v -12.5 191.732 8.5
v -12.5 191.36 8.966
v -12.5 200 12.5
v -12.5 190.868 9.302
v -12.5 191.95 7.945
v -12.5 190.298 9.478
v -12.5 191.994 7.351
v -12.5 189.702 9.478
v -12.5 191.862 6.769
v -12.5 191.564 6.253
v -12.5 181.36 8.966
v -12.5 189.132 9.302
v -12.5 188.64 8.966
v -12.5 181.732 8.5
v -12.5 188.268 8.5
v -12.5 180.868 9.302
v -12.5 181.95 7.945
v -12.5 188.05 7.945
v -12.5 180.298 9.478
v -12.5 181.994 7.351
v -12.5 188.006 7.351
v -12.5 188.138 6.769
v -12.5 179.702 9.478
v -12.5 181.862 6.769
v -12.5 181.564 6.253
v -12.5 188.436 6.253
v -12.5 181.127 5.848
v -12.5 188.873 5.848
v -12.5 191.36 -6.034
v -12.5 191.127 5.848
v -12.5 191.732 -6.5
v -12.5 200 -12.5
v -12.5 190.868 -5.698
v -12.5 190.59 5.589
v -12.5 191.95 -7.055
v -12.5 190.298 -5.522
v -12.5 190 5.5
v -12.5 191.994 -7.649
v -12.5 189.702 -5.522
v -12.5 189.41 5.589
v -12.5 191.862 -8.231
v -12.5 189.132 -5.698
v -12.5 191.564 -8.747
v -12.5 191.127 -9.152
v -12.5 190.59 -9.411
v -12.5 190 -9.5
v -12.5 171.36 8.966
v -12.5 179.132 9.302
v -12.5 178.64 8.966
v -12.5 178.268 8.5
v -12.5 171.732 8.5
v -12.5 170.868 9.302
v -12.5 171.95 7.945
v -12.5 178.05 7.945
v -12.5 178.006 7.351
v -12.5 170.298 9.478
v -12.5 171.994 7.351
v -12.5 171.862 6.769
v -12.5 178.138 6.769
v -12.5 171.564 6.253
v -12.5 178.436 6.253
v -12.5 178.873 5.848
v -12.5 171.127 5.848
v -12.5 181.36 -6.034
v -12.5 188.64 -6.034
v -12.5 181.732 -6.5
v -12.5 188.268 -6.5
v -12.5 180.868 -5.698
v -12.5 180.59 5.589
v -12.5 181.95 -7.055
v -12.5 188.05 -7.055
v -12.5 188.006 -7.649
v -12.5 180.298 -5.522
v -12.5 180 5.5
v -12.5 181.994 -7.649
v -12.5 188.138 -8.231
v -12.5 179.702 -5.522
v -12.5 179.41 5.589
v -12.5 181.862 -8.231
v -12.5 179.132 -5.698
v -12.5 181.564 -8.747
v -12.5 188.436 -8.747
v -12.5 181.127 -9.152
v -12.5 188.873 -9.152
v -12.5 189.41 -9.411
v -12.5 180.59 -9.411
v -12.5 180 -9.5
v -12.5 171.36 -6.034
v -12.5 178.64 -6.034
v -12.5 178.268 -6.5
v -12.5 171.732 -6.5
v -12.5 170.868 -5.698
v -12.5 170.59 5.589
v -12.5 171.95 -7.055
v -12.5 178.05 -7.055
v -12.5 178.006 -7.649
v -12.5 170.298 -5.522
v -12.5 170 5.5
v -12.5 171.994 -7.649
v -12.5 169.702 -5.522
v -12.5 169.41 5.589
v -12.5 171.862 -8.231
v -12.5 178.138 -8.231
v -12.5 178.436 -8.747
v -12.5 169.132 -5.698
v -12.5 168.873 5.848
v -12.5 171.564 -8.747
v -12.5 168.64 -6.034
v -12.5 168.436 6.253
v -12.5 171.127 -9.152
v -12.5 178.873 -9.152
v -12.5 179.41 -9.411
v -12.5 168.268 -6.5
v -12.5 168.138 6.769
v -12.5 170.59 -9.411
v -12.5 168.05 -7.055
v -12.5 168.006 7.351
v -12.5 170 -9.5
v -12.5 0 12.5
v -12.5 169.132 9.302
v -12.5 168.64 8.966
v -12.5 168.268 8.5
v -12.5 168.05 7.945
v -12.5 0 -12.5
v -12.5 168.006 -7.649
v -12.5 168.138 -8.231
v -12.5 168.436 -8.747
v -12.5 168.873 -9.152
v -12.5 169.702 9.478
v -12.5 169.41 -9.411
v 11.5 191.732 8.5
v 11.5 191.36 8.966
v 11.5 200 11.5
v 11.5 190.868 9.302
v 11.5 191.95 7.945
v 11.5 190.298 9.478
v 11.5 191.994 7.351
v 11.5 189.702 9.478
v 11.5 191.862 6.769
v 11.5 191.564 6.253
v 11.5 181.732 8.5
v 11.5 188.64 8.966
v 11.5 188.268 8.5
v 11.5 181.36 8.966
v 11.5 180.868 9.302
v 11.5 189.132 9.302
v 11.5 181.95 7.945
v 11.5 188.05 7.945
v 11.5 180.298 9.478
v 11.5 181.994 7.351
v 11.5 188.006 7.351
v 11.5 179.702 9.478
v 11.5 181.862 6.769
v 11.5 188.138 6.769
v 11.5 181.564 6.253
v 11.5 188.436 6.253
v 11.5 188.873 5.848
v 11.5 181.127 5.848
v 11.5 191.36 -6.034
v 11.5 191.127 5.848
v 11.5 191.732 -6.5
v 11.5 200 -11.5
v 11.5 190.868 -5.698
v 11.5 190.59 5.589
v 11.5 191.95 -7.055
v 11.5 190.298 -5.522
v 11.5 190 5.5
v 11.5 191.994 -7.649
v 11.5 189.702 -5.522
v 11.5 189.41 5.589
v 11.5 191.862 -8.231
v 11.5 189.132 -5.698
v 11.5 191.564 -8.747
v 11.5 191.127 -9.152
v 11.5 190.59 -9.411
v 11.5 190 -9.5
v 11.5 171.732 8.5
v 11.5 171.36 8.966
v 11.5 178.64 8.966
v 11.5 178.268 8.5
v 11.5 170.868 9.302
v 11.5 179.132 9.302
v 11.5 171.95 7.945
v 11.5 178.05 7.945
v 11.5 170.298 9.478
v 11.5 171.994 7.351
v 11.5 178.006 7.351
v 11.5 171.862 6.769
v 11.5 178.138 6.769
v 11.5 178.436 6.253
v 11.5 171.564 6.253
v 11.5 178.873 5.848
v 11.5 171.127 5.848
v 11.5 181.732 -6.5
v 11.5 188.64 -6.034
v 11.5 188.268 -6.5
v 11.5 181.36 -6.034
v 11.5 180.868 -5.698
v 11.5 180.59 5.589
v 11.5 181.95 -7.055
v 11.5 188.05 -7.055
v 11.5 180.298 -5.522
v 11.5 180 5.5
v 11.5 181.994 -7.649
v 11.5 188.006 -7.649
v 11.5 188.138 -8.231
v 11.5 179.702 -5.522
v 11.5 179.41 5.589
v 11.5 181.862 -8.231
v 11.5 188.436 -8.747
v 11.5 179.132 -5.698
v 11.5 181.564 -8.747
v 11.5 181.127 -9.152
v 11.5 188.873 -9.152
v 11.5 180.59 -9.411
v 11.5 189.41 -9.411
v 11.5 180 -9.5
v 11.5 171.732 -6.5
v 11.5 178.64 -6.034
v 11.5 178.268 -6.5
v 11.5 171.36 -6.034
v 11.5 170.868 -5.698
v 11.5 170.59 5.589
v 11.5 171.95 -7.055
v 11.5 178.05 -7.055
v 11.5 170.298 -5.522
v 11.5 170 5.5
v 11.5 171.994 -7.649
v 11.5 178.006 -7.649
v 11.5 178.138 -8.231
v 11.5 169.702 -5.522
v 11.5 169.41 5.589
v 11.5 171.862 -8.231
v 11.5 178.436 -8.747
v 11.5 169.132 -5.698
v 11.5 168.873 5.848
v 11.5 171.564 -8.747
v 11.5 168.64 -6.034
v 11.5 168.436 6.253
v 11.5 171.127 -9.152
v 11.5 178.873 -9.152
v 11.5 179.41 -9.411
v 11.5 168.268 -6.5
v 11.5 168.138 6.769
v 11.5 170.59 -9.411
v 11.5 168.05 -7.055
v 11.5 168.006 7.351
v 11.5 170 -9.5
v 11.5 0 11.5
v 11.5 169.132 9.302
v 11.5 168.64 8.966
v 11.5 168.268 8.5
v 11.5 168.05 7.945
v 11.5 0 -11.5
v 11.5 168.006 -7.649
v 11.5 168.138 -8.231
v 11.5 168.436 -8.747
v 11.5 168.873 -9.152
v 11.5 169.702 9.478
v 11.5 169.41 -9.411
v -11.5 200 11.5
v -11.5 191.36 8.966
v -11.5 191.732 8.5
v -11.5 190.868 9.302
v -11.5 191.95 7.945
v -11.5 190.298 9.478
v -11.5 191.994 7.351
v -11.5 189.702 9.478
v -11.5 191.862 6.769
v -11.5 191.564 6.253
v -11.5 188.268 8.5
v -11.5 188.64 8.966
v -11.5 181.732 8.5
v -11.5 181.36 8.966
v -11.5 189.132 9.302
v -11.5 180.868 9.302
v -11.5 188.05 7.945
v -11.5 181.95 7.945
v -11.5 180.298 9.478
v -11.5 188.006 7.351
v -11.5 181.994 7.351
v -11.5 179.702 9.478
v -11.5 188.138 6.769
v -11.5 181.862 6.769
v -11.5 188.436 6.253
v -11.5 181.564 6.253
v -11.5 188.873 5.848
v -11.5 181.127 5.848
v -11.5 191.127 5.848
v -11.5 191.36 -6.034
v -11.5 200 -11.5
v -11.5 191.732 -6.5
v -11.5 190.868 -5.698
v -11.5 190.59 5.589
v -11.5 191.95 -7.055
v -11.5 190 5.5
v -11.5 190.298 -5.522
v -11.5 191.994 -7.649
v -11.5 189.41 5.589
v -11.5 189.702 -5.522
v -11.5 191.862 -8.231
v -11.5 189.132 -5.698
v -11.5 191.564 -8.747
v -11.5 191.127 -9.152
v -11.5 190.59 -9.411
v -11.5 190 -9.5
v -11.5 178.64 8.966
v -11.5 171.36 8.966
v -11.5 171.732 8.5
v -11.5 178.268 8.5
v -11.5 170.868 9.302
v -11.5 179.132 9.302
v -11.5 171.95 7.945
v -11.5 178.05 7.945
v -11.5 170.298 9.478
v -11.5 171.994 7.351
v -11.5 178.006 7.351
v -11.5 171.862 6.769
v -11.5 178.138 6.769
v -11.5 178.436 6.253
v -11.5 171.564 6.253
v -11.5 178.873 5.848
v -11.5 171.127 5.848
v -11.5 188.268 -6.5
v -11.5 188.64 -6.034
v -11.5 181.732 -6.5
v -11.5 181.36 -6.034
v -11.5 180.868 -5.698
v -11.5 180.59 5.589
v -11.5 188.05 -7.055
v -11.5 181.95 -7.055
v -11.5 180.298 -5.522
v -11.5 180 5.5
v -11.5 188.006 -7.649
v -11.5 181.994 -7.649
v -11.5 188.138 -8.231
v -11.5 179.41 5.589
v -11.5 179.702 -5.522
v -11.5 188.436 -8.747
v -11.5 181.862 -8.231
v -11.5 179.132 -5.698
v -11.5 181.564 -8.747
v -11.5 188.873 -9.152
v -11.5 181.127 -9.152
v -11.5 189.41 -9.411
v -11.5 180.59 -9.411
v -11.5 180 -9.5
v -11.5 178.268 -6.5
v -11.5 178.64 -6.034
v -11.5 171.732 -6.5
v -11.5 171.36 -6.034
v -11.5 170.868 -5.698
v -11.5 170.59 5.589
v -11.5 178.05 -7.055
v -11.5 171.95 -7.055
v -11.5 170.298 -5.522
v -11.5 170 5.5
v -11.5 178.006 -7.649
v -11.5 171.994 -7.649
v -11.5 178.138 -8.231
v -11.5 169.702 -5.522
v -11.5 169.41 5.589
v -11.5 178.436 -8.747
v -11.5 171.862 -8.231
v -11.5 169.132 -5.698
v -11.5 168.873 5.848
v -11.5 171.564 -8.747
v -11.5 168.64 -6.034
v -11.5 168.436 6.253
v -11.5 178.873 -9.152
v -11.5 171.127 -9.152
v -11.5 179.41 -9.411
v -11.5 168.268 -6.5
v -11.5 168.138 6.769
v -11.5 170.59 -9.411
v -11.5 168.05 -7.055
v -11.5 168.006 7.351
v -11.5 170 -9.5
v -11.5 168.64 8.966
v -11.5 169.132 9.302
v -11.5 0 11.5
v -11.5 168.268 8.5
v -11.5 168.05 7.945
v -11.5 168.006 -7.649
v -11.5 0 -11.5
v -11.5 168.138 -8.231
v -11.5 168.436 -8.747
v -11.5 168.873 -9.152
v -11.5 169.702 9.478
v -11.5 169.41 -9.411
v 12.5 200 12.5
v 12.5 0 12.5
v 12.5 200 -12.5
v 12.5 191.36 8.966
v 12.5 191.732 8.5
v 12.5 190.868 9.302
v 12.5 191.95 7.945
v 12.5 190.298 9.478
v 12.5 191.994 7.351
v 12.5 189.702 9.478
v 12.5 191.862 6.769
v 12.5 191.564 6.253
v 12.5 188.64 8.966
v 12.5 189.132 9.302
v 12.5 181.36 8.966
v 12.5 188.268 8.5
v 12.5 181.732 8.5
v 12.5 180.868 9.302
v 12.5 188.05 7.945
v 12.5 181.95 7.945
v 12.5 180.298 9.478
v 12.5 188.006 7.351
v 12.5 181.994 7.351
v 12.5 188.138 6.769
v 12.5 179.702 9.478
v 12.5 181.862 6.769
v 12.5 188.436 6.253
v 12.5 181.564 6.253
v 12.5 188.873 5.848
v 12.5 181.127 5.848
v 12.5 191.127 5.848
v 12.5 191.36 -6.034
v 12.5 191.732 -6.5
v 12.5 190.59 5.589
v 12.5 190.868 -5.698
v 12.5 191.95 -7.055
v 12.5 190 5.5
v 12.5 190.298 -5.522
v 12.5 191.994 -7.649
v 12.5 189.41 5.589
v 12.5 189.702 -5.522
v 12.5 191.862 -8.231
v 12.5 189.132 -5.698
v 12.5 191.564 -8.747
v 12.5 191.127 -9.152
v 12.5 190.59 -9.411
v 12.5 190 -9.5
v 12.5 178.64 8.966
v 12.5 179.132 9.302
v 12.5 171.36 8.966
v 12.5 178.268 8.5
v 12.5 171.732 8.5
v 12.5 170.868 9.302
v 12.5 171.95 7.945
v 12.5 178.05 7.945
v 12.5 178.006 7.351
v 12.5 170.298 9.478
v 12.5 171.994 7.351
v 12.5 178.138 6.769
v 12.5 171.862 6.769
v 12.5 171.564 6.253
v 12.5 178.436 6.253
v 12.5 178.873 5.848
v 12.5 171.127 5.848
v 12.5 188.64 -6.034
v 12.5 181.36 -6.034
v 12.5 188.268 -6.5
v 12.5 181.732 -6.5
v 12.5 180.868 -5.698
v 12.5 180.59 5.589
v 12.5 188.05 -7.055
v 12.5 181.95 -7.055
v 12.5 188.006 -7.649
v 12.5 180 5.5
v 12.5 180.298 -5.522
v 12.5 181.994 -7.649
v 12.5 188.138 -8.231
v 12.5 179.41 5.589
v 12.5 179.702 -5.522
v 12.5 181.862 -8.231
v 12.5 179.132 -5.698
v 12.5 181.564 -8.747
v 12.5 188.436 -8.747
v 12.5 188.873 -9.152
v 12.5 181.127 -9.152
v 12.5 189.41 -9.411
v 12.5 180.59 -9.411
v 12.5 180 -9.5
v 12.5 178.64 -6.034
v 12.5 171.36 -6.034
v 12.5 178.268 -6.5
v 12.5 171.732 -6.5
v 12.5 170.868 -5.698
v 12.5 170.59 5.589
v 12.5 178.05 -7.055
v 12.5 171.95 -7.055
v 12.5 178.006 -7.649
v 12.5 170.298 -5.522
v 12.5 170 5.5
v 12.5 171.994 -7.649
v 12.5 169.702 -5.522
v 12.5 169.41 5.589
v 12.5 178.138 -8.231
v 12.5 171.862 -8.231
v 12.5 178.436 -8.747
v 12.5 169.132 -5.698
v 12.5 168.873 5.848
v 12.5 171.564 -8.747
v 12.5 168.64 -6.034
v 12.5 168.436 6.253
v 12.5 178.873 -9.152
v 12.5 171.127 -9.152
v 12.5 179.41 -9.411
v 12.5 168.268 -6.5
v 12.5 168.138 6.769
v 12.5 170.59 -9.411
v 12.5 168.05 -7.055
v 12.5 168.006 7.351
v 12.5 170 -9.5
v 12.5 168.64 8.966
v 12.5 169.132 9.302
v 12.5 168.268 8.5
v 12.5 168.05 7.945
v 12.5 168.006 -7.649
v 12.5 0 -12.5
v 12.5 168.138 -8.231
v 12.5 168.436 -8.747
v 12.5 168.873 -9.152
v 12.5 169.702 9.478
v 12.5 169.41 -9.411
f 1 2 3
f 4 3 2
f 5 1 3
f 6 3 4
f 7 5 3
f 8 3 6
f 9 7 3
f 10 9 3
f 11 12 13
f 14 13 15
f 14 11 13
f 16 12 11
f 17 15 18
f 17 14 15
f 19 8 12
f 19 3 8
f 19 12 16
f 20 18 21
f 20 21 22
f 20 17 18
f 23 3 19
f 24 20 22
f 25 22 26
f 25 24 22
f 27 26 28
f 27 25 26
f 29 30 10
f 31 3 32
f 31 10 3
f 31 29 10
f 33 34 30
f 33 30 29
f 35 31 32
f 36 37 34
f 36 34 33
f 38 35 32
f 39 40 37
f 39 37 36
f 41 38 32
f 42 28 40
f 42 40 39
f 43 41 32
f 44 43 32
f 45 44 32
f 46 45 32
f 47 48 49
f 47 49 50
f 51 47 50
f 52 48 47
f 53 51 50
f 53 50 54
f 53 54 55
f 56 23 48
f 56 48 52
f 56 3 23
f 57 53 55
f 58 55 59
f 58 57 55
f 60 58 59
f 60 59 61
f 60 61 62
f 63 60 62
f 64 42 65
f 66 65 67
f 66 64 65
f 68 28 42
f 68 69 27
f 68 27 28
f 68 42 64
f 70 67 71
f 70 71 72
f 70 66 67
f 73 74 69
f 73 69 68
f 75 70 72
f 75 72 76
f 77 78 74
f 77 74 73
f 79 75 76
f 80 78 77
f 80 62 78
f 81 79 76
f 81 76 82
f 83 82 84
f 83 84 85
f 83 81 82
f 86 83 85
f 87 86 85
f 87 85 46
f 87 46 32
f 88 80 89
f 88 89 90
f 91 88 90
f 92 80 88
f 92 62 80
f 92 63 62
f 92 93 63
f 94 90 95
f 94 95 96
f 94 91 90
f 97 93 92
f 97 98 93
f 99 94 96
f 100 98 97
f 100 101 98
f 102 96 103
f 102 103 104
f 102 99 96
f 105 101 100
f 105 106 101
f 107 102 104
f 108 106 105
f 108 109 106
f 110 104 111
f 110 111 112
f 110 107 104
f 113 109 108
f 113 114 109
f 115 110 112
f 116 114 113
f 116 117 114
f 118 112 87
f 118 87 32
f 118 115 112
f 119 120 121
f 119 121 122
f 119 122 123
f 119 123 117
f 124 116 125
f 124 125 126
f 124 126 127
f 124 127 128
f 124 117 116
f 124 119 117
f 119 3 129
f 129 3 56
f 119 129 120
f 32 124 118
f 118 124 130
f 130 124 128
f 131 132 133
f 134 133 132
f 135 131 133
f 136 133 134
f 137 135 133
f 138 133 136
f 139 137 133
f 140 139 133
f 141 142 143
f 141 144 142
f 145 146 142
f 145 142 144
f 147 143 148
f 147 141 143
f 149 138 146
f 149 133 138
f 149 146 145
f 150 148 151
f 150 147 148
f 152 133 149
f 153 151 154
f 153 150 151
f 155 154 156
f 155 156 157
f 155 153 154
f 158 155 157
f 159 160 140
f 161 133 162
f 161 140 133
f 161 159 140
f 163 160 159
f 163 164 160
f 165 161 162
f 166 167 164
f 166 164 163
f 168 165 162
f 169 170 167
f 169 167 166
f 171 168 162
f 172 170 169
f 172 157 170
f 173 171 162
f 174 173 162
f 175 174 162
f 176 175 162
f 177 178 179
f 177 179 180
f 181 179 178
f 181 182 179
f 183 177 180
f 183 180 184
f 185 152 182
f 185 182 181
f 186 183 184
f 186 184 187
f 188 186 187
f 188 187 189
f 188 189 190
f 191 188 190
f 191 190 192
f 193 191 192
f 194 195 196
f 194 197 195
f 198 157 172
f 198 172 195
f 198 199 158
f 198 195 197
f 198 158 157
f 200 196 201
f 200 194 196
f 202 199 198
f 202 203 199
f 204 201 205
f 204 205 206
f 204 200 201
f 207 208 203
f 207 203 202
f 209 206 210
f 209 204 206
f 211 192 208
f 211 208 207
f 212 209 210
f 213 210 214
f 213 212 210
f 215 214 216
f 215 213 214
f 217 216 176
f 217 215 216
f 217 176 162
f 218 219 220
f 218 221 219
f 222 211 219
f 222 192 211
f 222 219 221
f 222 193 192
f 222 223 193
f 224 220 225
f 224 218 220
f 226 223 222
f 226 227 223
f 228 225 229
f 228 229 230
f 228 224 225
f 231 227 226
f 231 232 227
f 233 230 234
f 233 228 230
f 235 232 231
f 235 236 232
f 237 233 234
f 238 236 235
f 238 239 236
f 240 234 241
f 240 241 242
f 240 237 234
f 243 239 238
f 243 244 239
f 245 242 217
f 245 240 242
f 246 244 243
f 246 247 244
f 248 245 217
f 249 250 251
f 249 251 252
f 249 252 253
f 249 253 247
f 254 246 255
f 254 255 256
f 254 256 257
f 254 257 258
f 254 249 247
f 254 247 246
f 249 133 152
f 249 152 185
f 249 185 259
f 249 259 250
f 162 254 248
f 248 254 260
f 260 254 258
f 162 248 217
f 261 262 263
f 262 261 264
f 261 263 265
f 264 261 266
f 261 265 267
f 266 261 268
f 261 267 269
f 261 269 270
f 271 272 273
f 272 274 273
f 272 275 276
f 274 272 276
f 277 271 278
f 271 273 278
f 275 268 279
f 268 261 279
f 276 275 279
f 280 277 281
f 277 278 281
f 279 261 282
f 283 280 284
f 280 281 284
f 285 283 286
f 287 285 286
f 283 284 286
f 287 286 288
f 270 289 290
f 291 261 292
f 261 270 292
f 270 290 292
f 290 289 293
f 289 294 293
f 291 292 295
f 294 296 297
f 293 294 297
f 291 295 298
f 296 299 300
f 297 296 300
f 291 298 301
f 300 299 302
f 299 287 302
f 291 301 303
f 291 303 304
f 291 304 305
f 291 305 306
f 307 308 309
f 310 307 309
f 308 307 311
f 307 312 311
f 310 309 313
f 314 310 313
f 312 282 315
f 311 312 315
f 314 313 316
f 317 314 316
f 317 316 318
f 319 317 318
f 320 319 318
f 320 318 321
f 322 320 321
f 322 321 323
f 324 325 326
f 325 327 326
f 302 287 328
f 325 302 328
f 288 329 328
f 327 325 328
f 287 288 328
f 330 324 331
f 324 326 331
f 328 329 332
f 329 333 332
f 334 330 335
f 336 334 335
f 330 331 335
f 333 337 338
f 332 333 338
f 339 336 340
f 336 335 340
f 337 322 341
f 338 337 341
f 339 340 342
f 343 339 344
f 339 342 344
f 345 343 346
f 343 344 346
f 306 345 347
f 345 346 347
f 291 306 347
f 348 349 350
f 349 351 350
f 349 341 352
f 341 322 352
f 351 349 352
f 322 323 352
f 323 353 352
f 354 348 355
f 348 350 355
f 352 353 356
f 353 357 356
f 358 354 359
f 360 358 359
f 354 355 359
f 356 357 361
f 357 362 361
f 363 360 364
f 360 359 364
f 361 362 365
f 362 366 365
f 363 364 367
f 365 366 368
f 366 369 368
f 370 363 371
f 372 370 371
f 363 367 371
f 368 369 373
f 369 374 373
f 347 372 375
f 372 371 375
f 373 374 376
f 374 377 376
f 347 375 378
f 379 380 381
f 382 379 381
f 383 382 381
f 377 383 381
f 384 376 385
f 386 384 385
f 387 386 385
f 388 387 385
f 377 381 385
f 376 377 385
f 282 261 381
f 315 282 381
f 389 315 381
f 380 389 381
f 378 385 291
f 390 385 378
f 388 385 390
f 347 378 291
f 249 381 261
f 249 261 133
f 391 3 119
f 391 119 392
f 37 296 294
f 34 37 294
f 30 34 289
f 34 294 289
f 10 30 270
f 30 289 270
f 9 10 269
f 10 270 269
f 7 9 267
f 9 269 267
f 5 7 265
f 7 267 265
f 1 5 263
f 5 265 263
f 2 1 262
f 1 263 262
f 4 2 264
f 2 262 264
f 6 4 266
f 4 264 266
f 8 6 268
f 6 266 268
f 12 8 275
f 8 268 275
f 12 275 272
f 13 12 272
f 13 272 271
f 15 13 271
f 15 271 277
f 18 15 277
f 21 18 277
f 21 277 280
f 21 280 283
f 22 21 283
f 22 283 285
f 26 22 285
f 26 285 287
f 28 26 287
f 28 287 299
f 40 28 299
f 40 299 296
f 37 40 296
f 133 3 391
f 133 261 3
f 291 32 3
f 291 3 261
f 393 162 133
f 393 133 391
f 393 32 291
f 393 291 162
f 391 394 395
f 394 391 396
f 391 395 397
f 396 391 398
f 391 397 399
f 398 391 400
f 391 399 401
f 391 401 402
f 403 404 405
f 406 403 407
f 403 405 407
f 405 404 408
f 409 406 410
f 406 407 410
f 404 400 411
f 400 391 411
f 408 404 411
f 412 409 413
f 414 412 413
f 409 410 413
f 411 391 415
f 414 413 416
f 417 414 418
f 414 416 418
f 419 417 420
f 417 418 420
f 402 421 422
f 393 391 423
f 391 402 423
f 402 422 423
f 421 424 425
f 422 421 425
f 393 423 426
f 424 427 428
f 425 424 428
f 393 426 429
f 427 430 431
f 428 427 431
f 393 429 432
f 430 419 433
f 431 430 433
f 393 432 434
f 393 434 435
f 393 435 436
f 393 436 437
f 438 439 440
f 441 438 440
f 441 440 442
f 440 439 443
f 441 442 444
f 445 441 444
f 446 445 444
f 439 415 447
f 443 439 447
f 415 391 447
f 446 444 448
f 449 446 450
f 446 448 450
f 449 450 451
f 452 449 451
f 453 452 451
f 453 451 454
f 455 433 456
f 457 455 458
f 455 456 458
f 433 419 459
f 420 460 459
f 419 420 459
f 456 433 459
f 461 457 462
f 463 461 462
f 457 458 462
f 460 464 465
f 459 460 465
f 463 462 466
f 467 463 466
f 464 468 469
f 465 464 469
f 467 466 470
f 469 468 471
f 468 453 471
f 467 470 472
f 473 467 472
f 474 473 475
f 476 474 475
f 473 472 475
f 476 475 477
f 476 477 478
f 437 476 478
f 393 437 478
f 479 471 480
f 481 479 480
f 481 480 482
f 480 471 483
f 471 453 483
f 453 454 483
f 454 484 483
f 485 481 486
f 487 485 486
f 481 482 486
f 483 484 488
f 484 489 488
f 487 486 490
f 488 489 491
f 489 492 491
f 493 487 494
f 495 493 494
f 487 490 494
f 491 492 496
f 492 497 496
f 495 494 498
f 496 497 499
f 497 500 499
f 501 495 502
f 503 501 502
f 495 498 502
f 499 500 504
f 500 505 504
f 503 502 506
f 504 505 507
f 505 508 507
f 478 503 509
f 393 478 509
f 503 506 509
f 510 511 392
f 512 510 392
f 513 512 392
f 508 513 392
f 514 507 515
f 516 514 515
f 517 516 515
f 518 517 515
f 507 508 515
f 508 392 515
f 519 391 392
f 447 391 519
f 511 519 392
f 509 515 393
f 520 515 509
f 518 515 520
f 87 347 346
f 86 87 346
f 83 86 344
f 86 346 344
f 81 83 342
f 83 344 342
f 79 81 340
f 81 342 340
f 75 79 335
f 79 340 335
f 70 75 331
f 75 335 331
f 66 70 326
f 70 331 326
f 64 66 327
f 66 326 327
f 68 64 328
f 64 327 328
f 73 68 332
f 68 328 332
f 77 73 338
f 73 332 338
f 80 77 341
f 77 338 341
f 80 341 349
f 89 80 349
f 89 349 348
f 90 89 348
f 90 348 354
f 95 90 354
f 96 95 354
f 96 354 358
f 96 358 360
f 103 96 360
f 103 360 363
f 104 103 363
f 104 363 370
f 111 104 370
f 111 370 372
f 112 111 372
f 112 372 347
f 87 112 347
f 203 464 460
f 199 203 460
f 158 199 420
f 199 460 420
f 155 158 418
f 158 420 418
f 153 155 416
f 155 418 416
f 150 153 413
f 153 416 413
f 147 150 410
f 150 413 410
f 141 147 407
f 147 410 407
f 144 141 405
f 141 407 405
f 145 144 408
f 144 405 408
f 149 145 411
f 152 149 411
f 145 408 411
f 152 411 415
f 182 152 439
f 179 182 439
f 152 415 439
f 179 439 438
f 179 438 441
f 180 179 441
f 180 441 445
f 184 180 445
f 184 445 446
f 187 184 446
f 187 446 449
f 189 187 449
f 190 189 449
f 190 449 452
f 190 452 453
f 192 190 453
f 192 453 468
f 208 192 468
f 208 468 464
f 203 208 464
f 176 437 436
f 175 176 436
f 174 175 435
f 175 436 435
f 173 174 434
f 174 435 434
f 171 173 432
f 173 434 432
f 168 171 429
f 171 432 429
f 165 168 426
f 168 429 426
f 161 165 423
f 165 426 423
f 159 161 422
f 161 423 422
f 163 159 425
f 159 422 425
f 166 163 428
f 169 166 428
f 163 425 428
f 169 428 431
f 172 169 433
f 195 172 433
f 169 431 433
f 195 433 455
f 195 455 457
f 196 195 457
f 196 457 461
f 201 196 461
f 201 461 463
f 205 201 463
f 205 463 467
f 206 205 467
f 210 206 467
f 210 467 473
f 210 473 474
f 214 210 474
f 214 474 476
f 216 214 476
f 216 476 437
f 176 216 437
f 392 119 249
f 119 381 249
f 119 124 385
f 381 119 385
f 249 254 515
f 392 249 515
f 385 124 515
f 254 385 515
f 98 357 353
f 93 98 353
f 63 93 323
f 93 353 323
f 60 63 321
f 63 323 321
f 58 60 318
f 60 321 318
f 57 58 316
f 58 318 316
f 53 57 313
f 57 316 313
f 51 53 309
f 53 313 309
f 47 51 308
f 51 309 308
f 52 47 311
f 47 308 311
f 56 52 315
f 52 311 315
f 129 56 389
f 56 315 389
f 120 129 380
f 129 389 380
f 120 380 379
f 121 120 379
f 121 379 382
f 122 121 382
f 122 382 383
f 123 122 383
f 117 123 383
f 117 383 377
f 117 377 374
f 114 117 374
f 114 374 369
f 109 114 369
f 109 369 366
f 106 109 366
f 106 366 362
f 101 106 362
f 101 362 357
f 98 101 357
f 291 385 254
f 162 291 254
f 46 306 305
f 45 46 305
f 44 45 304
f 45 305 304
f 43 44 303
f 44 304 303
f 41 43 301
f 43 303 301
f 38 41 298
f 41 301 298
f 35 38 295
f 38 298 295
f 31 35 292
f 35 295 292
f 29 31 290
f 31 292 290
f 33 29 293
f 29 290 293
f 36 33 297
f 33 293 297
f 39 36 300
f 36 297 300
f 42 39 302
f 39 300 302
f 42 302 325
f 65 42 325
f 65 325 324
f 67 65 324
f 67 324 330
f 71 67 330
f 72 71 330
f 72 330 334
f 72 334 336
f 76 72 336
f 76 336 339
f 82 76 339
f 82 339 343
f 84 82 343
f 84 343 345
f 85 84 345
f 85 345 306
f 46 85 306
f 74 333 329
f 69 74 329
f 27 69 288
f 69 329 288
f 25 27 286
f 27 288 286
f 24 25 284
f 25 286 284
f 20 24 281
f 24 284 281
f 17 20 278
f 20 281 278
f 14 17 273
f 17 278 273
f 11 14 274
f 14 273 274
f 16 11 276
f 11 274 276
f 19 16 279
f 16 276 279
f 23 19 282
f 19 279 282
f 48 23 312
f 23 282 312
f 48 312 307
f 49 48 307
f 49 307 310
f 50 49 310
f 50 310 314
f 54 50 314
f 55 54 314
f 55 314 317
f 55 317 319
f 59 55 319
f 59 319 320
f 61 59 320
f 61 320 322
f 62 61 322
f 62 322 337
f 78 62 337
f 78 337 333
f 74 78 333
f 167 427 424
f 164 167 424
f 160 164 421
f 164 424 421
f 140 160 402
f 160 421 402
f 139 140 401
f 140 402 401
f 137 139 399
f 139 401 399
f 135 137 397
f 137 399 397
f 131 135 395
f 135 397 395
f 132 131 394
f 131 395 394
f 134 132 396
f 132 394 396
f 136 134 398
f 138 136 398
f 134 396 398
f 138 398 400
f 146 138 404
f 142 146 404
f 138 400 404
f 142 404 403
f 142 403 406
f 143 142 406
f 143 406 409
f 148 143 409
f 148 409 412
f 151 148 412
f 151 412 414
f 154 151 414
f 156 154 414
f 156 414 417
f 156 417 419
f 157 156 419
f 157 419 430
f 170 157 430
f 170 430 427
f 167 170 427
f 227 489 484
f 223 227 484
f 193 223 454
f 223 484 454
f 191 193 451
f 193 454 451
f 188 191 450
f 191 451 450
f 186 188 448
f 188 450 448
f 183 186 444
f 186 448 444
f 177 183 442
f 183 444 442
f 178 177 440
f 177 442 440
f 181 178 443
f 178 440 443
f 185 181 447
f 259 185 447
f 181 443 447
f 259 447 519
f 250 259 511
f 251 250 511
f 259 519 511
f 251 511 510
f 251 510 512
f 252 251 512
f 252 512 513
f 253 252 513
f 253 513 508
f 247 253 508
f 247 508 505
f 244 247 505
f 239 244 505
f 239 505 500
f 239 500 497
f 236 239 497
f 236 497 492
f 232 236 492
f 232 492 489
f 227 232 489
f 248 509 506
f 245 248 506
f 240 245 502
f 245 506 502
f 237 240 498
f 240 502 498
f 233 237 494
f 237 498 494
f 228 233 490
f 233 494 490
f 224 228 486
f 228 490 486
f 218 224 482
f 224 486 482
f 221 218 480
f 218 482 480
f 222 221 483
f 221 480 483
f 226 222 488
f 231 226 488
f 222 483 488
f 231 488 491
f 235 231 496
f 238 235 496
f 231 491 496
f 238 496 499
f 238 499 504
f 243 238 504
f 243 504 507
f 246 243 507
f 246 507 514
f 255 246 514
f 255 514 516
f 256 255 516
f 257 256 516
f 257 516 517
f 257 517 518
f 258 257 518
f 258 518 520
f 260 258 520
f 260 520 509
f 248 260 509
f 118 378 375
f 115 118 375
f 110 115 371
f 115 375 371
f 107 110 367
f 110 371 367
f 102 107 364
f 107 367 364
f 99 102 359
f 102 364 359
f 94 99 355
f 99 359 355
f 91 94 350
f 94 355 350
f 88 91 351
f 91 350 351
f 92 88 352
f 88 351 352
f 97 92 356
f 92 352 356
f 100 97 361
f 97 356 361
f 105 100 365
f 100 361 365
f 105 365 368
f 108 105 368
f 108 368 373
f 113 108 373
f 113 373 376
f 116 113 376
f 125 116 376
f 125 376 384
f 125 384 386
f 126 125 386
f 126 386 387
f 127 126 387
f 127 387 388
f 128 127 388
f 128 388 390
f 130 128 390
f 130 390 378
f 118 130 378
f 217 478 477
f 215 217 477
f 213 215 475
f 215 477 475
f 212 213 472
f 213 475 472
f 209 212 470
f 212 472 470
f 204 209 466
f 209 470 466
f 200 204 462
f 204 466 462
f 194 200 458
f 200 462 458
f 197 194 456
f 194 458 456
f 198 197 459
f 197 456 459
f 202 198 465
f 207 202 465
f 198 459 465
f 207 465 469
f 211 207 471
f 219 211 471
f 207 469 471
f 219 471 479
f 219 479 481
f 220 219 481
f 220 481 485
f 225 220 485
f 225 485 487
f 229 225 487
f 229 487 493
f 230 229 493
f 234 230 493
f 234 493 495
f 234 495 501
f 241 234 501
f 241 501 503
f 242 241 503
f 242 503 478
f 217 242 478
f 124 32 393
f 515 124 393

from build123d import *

# Parameters (mm, degrees)
SKETCH1_W           = 25
SKETCH1_H           = 25
SKETCH1_W_2         = 23
SKETCH1_H_2         = 23
BOSS_EXTRUDE1_DEPTH = 200
SKETCH3_R           = 2
CUT_EXTRUDE1_DEPTH  = 25


with BuildPart() as part:
    # Sketch1 → Boss-Extrude1 (new body)
    with BuildSketch(Plane(origin=(0, 0, 0), x_dir=(1, 0, 0), z_dir=(0, 1, 0))):
        Rectangle(SKETCH1_W, SKETCH1_H)
        Rectangle(SKETCH1_W_2, SKETCH1_H_2, mode=Mode.SUBTRACT)
    extrude(amount=BOSS_EXTRUDE1_DEPTH)

    # Sketch3 → Cut-Extrude1 (cut)
    with BuildSketch(Plane(origin=(12.5, 0, 0), x_dir=(0, 0, -1), z_dir=(1, 0, 0))):
        with Locations((7.5, 190)):
            Circle(SKETCH3_R)
        with Locations((7.5, 180)):
            Circle(SKETCH3_R)
        with Locations((-7.5, 190)):
            Circle(SKETCH3_R)
        with Locations((-7.5, 180)):
            Circle(SKETCH3_R)
        with Locations((7.5, 170)):
            Circle(SKETCH3_R)
        with Locations((-7.5, 170)):
            Circle(SKETCH3_R)
    extrude(amount=-CUT_EXTRUDE1_DEPTH, mode=Mode.SUBTRACT)


solid = part.part
